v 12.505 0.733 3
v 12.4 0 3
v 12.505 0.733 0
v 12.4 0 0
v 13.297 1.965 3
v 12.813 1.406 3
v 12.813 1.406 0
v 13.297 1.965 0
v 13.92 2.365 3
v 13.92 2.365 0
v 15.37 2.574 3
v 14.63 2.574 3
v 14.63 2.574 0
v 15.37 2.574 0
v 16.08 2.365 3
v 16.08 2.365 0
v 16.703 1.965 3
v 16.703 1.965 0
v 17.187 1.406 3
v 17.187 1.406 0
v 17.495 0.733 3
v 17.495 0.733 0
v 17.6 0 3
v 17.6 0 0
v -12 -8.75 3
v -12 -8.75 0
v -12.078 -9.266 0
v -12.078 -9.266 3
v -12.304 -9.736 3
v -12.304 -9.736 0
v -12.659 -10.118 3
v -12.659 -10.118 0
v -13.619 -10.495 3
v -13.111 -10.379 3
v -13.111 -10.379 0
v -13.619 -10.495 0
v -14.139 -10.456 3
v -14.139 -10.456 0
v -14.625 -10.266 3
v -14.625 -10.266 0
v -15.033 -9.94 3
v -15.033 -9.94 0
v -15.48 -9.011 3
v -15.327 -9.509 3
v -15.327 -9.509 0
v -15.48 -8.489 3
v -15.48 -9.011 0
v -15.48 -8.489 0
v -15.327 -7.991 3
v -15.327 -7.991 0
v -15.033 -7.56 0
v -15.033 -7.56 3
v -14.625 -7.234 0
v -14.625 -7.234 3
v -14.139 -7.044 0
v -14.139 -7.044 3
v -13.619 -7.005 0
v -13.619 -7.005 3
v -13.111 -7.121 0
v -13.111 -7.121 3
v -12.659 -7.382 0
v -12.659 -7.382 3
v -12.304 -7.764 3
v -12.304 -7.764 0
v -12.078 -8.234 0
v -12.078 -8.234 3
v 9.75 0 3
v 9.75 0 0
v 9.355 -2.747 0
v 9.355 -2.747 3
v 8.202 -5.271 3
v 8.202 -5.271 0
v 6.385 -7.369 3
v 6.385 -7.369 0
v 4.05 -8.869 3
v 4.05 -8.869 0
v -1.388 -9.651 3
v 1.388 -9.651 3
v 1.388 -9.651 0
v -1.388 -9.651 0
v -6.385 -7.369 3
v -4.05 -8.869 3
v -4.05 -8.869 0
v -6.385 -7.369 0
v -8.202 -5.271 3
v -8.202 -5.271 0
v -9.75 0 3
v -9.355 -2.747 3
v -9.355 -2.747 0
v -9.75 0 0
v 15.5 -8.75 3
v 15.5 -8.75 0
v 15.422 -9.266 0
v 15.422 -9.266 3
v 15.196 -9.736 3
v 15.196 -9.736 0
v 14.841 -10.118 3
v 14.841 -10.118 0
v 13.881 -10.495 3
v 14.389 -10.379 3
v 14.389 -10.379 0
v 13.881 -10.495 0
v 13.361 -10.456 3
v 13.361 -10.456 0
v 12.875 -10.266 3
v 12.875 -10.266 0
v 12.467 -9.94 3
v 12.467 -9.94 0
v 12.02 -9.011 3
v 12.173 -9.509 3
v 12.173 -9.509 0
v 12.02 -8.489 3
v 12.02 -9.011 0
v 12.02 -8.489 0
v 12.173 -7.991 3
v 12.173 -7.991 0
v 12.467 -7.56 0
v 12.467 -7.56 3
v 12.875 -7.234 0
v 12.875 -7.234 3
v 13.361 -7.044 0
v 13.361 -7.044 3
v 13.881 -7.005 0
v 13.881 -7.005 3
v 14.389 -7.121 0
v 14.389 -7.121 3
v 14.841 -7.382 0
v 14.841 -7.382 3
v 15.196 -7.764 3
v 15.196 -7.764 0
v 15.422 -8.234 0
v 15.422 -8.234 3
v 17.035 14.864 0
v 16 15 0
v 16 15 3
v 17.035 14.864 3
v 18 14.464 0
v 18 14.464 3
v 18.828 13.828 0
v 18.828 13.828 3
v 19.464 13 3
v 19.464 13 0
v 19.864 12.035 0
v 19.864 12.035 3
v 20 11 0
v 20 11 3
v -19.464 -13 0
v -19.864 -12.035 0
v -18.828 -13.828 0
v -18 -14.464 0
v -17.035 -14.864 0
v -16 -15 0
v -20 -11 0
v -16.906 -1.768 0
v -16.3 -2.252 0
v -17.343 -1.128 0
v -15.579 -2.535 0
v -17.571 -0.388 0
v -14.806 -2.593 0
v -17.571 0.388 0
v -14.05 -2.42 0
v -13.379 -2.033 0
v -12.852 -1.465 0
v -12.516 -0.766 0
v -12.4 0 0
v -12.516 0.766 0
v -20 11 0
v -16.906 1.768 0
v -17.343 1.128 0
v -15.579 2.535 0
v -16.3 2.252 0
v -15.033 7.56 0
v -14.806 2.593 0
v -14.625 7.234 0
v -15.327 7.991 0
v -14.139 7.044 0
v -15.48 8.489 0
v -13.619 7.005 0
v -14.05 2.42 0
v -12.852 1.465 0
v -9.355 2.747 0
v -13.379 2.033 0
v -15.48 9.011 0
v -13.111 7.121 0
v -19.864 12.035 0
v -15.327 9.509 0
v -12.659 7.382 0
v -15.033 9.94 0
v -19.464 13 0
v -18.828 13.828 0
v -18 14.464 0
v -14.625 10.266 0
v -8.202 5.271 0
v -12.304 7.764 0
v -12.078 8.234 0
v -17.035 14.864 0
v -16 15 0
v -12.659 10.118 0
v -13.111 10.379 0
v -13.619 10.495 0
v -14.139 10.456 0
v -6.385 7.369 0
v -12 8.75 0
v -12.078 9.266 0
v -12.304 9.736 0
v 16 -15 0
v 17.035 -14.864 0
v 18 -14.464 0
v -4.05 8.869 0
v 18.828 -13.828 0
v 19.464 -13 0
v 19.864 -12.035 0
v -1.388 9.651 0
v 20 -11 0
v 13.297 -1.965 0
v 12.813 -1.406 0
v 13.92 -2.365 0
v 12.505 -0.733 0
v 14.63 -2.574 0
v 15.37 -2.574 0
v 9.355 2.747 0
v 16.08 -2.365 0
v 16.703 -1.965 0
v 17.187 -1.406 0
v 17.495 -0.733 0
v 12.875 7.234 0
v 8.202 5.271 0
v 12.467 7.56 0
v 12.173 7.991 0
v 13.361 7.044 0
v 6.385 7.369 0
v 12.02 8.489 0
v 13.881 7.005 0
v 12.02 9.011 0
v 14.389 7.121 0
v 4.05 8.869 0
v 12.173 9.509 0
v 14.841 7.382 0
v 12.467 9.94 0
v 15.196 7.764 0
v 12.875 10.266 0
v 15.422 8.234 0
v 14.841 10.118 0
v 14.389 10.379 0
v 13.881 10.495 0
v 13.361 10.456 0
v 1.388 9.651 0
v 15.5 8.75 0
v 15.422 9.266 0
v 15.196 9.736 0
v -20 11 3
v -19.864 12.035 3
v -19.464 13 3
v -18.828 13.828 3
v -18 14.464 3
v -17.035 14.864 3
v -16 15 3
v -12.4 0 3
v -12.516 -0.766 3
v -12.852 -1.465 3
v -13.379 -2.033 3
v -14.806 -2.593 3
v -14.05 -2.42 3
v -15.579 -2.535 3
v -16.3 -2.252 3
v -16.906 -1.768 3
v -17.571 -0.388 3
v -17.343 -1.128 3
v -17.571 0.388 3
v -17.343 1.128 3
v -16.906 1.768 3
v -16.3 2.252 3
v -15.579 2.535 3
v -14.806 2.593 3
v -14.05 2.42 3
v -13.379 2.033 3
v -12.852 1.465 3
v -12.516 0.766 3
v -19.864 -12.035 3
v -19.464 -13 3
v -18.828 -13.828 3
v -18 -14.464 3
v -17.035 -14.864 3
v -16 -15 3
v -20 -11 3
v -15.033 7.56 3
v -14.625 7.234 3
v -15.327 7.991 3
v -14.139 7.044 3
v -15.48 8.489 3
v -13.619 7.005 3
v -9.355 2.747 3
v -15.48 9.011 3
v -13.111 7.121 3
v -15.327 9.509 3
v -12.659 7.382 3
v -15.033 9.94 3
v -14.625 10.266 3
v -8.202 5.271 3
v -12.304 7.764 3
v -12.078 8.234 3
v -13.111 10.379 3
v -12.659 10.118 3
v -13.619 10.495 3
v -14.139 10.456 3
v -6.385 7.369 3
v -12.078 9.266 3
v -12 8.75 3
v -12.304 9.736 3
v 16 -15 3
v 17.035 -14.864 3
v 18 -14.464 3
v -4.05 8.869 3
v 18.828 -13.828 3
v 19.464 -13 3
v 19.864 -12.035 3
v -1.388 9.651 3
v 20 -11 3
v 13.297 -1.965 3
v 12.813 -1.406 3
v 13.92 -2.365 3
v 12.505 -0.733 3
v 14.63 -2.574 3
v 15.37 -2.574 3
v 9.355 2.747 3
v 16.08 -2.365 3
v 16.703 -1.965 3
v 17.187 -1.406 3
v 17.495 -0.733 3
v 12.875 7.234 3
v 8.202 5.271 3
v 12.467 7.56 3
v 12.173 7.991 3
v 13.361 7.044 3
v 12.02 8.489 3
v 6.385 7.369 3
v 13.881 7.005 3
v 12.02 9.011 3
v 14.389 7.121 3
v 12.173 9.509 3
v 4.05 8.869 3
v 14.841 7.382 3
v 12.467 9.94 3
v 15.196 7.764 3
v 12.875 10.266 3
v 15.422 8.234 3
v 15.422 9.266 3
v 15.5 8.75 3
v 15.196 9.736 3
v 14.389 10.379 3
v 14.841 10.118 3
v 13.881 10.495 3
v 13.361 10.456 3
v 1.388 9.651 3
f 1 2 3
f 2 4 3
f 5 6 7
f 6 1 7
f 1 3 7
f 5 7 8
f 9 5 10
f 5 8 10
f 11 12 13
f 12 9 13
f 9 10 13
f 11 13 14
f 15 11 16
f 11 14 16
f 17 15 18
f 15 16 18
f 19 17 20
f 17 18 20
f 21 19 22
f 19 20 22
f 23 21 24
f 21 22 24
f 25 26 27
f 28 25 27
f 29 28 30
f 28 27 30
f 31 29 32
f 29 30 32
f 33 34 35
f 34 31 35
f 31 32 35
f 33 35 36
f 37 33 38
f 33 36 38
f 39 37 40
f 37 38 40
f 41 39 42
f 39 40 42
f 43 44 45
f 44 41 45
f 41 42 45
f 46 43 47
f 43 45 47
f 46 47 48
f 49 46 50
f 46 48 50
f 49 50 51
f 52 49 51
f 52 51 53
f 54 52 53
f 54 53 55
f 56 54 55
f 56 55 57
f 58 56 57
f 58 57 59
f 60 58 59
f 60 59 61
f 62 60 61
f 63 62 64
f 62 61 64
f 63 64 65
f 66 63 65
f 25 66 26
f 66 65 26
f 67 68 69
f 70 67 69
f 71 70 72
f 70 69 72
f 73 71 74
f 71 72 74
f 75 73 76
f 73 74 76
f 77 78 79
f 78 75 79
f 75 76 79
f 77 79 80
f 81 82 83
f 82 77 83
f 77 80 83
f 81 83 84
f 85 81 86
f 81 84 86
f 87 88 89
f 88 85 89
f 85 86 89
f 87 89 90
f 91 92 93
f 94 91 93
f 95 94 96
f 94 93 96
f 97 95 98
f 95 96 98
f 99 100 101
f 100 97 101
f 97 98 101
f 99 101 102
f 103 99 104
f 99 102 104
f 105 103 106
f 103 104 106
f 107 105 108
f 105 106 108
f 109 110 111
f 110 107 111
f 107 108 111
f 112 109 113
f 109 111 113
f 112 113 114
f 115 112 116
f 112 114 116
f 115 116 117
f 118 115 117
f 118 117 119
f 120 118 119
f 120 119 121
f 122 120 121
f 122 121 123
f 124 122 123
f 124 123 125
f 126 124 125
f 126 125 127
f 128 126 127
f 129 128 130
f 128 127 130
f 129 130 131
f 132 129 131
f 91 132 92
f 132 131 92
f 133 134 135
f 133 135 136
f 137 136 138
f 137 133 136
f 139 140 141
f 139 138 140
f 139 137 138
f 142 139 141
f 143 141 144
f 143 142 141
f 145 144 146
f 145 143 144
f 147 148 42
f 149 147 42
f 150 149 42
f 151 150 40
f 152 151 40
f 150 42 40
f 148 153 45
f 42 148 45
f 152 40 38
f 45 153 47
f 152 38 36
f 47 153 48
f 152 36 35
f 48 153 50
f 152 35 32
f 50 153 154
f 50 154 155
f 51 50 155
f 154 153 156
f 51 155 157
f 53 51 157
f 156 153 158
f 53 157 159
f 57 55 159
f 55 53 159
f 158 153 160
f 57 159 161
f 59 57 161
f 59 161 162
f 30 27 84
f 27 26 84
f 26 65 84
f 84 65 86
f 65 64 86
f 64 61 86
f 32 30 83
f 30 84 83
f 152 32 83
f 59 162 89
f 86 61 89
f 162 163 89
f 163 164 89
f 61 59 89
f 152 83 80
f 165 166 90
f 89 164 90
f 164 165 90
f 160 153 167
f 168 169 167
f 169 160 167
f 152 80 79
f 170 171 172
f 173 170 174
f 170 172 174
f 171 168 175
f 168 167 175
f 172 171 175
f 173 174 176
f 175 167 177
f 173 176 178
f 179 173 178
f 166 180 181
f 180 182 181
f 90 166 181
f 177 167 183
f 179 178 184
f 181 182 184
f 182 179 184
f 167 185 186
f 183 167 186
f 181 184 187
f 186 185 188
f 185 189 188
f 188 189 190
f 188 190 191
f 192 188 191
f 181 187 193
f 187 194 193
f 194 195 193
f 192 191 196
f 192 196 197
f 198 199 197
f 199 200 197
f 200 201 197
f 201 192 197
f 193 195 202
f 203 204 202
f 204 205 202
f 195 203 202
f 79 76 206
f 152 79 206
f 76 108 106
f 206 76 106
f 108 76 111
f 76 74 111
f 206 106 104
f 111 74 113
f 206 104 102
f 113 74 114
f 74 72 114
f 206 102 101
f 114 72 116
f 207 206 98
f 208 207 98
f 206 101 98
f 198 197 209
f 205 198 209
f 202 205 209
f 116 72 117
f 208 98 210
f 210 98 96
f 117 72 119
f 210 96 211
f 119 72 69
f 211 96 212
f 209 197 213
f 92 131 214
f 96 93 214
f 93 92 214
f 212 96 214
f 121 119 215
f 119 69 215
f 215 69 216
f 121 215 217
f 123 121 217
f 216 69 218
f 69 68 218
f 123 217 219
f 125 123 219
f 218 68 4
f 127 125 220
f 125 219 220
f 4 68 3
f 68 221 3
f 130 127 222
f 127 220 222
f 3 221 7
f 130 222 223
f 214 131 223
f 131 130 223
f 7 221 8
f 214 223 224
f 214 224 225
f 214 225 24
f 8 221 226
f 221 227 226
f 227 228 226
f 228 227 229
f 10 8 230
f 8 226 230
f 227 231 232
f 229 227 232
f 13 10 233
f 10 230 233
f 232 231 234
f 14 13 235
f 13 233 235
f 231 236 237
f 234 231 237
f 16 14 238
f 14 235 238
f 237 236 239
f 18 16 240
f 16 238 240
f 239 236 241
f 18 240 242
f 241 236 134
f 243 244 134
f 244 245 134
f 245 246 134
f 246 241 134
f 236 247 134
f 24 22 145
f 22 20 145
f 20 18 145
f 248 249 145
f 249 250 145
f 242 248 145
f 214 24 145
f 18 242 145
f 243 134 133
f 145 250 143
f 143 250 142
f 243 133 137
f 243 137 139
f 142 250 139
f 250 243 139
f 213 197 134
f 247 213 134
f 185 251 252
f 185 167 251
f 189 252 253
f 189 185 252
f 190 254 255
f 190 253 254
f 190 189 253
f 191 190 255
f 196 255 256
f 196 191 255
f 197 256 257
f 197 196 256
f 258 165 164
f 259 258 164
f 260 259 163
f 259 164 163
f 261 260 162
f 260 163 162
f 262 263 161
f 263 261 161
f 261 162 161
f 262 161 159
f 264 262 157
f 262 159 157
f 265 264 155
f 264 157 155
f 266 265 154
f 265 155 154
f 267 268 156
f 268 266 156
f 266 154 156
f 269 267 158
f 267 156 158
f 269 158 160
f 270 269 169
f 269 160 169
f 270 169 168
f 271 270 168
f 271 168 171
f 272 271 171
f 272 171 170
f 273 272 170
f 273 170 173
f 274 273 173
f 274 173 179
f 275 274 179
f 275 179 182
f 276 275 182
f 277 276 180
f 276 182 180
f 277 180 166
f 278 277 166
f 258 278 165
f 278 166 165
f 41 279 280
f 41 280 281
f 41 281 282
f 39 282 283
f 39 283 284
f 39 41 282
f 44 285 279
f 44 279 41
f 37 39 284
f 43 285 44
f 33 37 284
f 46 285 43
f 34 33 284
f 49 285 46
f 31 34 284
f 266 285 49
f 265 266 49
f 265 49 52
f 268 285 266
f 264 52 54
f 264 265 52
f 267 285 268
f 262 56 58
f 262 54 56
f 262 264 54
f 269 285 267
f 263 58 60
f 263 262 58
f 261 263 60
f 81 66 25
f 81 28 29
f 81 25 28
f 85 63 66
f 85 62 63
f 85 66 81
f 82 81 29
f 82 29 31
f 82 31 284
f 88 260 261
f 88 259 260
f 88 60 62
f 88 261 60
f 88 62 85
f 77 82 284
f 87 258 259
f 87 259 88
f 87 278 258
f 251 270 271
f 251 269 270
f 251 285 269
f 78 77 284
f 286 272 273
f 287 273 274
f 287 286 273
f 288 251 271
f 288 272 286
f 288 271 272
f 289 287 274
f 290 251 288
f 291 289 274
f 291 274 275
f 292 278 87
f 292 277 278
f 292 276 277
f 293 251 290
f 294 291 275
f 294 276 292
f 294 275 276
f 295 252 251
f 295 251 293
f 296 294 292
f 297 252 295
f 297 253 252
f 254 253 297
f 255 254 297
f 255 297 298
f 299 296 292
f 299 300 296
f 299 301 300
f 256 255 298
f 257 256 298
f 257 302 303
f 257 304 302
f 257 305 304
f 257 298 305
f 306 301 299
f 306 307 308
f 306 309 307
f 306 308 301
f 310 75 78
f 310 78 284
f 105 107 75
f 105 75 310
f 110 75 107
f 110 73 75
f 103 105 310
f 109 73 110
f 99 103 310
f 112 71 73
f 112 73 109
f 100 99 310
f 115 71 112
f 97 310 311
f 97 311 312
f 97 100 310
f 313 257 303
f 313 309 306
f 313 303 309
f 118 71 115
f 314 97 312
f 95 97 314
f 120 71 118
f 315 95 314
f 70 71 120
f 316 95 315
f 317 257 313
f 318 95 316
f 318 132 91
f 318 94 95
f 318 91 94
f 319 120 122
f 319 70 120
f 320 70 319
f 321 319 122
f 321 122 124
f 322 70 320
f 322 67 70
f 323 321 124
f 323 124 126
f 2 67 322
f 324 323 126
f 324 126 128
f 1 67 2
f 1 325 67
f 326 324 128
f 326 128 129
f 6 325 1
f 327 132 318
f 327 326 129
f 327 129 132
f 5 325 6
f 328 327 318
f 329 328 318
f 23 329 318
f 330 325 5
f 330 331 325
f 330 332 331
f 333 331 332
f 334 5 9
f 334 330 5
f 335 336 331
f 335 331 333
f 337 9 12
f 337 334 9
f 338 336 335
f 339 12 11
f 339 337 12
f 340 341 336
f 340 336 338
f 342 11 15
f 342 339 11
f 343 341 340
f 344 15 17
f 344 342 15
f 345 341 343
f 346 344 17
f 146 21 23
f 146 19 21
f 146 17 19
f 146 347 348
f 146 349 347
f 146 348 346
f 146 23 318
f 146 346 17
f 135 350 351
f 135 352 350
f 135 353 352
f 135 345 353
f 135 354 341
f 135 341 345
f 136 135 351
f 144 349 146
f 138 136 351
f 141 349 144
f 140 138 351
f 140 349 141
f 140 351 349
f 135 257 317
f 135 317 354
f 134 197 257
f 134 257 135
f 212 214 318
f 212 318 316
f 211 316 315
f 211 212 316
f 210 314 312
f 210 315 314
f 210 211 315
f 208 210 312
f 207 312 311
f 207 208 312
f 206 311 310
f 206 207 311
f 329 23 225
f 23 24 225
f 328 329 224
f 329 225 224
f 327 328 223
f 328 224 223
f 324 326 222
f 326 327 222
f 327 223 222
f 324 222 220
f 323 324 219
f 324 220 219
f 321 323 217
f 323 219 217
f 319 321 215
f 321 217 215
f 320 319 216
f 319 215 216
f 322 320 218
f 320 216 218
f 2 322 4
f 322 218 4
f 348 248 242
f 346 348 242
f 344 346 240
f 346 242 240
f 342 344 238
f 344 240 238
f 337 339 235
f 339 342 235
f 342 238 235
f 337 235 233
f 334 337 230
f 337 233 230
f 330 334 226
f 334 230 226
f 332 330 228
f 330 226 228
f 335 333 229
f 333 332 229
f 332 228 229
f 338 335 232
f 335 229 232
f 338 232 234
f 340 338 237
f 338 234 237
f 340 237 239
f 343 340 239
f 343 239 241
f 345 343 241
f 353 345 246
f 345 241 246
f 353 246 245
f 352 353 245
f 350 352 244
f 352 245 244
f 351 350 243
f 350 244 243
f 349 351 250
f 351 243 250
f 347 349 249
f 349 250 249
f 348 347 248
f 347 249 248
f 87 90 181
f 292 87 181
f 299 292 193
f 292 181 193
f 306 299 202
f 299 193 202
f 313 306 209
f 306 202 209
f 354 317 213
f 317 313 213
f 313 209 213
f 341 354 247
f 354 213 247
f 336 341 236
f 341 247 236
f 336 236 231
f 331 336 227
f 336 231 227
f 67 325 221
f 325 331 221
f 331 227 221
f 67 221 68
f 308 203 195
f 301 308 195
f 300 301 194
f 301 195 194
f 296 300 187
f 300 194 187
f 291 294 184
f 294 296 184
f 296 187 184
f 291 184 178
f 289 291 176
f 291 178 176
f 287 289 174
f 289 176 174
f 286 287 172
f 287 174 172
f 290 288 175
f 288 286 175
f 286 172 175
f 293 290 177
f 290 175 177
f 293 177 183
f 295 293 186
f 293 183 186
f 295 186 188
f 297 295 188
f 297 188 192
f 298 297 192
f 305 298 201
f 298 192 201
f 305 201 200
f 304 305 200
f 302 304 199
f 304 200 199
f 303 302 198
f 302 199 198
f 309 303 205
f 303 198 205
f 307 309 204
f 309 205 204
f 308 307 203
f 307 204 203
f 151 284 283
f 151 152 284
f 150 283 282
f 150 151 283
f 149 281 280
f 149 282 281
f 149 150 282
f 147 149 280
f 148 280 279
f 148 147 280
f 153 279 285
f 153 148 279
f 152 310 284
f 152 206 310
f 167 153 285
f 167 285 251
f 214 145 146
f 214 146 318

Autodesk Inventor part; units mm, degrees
ref_plane "YZ Plane" through (0, 0, 0) normal (1, 0, 0) x (0, 1, 0)
ref_plane "XZ Plane" through (0, 0, 0) normal (0, 1, 0) x (-1, 0, 0)
ref_plane "XY Plane" through (0, 0, 0) normal (0, 0, 1) x (1, 0, 0)
sketch "Sketch1" plane through (0, 0, 0) normal (0, 0, 1) x (1, 0, 0)
  arc A0 (13.75, 13) -> (18, 8.75) centre (13.75, 8.75) ccw construction
  line L0 (18, -8.75) -> (18, 8.75) construction
  arc A1 (18, -8.75) -> (13.75, -13) centre (13.75, -8.75) ccw construction
  line L1 (-13.75, -13) -> (13.75, -13) construction
  arc A2 (-13.75, -13) -> (-18, -8.75) centre (-13.75, -8.75) ccw construction
  line L2 (-18, 8.75) -> (-18, -8.75) construction
  arc A3 (-18, 8.75) -> (-13.75, 13) centre (-13.75, 8.75) ccw construction
  line L3 (13.75, 13) -> (-13.75, 13) construction
  circle A4 centre (-13.75, 8.75) radius 2.25 construction
  circle A5 centre (13.75, -8.75) radius 2.25 construction
  circle A6 centre (13.75, 8.75) radius 2.25 construction
  circle A7 centre (-13.75, -8.75) radius 2.25 construction
  arc A8 (-20, -11) -> (-16, -15) centre (-16, -11) ccw projected
  line L4 (16, -15) -> (-16, -15) projected
  arc A9 (16, -15) -> (20, -11) centre (16, -11) ccw projected
  line L5 (20, 11) -> (20, -11) projected
  arc A10 (20, 11) -> (16, 15) centre (16, 11) ccw projected
  line L6 (-16, 15) -> (16, 15) projected
  arc A11 (-16, 15) -> (-20, 11) centre (-16, 11) ccw projected
  line L7 (-20, -11) -> (-20, 11) projected
  circle A12 centre (-13.75, 8.75) radius 1.75
  circle A13 centre (13.75, 8.75) radius 1.75
  circle A14 centre (13.75, -8.75) radius 1.75
  circle A15 centre (-13.75, -8.75) radius 1.75
  circle A16 centre (0, 0) radius 9.75
  circle A17 centre (-15, 0) radius 2.6
  circle A18 centre (15, 0) radius 2.6
  line L8 (-15, 0) -> (15, 0)
  dimension "d0" = 3.5
  dimension "d1" = 19.5
  dimension "d2" = 5.2
  dimension "d3" = 30
extrude "Extrusion1" add sketch "Sketch1" along normal blind 3
properties part number "button_holder_face"
